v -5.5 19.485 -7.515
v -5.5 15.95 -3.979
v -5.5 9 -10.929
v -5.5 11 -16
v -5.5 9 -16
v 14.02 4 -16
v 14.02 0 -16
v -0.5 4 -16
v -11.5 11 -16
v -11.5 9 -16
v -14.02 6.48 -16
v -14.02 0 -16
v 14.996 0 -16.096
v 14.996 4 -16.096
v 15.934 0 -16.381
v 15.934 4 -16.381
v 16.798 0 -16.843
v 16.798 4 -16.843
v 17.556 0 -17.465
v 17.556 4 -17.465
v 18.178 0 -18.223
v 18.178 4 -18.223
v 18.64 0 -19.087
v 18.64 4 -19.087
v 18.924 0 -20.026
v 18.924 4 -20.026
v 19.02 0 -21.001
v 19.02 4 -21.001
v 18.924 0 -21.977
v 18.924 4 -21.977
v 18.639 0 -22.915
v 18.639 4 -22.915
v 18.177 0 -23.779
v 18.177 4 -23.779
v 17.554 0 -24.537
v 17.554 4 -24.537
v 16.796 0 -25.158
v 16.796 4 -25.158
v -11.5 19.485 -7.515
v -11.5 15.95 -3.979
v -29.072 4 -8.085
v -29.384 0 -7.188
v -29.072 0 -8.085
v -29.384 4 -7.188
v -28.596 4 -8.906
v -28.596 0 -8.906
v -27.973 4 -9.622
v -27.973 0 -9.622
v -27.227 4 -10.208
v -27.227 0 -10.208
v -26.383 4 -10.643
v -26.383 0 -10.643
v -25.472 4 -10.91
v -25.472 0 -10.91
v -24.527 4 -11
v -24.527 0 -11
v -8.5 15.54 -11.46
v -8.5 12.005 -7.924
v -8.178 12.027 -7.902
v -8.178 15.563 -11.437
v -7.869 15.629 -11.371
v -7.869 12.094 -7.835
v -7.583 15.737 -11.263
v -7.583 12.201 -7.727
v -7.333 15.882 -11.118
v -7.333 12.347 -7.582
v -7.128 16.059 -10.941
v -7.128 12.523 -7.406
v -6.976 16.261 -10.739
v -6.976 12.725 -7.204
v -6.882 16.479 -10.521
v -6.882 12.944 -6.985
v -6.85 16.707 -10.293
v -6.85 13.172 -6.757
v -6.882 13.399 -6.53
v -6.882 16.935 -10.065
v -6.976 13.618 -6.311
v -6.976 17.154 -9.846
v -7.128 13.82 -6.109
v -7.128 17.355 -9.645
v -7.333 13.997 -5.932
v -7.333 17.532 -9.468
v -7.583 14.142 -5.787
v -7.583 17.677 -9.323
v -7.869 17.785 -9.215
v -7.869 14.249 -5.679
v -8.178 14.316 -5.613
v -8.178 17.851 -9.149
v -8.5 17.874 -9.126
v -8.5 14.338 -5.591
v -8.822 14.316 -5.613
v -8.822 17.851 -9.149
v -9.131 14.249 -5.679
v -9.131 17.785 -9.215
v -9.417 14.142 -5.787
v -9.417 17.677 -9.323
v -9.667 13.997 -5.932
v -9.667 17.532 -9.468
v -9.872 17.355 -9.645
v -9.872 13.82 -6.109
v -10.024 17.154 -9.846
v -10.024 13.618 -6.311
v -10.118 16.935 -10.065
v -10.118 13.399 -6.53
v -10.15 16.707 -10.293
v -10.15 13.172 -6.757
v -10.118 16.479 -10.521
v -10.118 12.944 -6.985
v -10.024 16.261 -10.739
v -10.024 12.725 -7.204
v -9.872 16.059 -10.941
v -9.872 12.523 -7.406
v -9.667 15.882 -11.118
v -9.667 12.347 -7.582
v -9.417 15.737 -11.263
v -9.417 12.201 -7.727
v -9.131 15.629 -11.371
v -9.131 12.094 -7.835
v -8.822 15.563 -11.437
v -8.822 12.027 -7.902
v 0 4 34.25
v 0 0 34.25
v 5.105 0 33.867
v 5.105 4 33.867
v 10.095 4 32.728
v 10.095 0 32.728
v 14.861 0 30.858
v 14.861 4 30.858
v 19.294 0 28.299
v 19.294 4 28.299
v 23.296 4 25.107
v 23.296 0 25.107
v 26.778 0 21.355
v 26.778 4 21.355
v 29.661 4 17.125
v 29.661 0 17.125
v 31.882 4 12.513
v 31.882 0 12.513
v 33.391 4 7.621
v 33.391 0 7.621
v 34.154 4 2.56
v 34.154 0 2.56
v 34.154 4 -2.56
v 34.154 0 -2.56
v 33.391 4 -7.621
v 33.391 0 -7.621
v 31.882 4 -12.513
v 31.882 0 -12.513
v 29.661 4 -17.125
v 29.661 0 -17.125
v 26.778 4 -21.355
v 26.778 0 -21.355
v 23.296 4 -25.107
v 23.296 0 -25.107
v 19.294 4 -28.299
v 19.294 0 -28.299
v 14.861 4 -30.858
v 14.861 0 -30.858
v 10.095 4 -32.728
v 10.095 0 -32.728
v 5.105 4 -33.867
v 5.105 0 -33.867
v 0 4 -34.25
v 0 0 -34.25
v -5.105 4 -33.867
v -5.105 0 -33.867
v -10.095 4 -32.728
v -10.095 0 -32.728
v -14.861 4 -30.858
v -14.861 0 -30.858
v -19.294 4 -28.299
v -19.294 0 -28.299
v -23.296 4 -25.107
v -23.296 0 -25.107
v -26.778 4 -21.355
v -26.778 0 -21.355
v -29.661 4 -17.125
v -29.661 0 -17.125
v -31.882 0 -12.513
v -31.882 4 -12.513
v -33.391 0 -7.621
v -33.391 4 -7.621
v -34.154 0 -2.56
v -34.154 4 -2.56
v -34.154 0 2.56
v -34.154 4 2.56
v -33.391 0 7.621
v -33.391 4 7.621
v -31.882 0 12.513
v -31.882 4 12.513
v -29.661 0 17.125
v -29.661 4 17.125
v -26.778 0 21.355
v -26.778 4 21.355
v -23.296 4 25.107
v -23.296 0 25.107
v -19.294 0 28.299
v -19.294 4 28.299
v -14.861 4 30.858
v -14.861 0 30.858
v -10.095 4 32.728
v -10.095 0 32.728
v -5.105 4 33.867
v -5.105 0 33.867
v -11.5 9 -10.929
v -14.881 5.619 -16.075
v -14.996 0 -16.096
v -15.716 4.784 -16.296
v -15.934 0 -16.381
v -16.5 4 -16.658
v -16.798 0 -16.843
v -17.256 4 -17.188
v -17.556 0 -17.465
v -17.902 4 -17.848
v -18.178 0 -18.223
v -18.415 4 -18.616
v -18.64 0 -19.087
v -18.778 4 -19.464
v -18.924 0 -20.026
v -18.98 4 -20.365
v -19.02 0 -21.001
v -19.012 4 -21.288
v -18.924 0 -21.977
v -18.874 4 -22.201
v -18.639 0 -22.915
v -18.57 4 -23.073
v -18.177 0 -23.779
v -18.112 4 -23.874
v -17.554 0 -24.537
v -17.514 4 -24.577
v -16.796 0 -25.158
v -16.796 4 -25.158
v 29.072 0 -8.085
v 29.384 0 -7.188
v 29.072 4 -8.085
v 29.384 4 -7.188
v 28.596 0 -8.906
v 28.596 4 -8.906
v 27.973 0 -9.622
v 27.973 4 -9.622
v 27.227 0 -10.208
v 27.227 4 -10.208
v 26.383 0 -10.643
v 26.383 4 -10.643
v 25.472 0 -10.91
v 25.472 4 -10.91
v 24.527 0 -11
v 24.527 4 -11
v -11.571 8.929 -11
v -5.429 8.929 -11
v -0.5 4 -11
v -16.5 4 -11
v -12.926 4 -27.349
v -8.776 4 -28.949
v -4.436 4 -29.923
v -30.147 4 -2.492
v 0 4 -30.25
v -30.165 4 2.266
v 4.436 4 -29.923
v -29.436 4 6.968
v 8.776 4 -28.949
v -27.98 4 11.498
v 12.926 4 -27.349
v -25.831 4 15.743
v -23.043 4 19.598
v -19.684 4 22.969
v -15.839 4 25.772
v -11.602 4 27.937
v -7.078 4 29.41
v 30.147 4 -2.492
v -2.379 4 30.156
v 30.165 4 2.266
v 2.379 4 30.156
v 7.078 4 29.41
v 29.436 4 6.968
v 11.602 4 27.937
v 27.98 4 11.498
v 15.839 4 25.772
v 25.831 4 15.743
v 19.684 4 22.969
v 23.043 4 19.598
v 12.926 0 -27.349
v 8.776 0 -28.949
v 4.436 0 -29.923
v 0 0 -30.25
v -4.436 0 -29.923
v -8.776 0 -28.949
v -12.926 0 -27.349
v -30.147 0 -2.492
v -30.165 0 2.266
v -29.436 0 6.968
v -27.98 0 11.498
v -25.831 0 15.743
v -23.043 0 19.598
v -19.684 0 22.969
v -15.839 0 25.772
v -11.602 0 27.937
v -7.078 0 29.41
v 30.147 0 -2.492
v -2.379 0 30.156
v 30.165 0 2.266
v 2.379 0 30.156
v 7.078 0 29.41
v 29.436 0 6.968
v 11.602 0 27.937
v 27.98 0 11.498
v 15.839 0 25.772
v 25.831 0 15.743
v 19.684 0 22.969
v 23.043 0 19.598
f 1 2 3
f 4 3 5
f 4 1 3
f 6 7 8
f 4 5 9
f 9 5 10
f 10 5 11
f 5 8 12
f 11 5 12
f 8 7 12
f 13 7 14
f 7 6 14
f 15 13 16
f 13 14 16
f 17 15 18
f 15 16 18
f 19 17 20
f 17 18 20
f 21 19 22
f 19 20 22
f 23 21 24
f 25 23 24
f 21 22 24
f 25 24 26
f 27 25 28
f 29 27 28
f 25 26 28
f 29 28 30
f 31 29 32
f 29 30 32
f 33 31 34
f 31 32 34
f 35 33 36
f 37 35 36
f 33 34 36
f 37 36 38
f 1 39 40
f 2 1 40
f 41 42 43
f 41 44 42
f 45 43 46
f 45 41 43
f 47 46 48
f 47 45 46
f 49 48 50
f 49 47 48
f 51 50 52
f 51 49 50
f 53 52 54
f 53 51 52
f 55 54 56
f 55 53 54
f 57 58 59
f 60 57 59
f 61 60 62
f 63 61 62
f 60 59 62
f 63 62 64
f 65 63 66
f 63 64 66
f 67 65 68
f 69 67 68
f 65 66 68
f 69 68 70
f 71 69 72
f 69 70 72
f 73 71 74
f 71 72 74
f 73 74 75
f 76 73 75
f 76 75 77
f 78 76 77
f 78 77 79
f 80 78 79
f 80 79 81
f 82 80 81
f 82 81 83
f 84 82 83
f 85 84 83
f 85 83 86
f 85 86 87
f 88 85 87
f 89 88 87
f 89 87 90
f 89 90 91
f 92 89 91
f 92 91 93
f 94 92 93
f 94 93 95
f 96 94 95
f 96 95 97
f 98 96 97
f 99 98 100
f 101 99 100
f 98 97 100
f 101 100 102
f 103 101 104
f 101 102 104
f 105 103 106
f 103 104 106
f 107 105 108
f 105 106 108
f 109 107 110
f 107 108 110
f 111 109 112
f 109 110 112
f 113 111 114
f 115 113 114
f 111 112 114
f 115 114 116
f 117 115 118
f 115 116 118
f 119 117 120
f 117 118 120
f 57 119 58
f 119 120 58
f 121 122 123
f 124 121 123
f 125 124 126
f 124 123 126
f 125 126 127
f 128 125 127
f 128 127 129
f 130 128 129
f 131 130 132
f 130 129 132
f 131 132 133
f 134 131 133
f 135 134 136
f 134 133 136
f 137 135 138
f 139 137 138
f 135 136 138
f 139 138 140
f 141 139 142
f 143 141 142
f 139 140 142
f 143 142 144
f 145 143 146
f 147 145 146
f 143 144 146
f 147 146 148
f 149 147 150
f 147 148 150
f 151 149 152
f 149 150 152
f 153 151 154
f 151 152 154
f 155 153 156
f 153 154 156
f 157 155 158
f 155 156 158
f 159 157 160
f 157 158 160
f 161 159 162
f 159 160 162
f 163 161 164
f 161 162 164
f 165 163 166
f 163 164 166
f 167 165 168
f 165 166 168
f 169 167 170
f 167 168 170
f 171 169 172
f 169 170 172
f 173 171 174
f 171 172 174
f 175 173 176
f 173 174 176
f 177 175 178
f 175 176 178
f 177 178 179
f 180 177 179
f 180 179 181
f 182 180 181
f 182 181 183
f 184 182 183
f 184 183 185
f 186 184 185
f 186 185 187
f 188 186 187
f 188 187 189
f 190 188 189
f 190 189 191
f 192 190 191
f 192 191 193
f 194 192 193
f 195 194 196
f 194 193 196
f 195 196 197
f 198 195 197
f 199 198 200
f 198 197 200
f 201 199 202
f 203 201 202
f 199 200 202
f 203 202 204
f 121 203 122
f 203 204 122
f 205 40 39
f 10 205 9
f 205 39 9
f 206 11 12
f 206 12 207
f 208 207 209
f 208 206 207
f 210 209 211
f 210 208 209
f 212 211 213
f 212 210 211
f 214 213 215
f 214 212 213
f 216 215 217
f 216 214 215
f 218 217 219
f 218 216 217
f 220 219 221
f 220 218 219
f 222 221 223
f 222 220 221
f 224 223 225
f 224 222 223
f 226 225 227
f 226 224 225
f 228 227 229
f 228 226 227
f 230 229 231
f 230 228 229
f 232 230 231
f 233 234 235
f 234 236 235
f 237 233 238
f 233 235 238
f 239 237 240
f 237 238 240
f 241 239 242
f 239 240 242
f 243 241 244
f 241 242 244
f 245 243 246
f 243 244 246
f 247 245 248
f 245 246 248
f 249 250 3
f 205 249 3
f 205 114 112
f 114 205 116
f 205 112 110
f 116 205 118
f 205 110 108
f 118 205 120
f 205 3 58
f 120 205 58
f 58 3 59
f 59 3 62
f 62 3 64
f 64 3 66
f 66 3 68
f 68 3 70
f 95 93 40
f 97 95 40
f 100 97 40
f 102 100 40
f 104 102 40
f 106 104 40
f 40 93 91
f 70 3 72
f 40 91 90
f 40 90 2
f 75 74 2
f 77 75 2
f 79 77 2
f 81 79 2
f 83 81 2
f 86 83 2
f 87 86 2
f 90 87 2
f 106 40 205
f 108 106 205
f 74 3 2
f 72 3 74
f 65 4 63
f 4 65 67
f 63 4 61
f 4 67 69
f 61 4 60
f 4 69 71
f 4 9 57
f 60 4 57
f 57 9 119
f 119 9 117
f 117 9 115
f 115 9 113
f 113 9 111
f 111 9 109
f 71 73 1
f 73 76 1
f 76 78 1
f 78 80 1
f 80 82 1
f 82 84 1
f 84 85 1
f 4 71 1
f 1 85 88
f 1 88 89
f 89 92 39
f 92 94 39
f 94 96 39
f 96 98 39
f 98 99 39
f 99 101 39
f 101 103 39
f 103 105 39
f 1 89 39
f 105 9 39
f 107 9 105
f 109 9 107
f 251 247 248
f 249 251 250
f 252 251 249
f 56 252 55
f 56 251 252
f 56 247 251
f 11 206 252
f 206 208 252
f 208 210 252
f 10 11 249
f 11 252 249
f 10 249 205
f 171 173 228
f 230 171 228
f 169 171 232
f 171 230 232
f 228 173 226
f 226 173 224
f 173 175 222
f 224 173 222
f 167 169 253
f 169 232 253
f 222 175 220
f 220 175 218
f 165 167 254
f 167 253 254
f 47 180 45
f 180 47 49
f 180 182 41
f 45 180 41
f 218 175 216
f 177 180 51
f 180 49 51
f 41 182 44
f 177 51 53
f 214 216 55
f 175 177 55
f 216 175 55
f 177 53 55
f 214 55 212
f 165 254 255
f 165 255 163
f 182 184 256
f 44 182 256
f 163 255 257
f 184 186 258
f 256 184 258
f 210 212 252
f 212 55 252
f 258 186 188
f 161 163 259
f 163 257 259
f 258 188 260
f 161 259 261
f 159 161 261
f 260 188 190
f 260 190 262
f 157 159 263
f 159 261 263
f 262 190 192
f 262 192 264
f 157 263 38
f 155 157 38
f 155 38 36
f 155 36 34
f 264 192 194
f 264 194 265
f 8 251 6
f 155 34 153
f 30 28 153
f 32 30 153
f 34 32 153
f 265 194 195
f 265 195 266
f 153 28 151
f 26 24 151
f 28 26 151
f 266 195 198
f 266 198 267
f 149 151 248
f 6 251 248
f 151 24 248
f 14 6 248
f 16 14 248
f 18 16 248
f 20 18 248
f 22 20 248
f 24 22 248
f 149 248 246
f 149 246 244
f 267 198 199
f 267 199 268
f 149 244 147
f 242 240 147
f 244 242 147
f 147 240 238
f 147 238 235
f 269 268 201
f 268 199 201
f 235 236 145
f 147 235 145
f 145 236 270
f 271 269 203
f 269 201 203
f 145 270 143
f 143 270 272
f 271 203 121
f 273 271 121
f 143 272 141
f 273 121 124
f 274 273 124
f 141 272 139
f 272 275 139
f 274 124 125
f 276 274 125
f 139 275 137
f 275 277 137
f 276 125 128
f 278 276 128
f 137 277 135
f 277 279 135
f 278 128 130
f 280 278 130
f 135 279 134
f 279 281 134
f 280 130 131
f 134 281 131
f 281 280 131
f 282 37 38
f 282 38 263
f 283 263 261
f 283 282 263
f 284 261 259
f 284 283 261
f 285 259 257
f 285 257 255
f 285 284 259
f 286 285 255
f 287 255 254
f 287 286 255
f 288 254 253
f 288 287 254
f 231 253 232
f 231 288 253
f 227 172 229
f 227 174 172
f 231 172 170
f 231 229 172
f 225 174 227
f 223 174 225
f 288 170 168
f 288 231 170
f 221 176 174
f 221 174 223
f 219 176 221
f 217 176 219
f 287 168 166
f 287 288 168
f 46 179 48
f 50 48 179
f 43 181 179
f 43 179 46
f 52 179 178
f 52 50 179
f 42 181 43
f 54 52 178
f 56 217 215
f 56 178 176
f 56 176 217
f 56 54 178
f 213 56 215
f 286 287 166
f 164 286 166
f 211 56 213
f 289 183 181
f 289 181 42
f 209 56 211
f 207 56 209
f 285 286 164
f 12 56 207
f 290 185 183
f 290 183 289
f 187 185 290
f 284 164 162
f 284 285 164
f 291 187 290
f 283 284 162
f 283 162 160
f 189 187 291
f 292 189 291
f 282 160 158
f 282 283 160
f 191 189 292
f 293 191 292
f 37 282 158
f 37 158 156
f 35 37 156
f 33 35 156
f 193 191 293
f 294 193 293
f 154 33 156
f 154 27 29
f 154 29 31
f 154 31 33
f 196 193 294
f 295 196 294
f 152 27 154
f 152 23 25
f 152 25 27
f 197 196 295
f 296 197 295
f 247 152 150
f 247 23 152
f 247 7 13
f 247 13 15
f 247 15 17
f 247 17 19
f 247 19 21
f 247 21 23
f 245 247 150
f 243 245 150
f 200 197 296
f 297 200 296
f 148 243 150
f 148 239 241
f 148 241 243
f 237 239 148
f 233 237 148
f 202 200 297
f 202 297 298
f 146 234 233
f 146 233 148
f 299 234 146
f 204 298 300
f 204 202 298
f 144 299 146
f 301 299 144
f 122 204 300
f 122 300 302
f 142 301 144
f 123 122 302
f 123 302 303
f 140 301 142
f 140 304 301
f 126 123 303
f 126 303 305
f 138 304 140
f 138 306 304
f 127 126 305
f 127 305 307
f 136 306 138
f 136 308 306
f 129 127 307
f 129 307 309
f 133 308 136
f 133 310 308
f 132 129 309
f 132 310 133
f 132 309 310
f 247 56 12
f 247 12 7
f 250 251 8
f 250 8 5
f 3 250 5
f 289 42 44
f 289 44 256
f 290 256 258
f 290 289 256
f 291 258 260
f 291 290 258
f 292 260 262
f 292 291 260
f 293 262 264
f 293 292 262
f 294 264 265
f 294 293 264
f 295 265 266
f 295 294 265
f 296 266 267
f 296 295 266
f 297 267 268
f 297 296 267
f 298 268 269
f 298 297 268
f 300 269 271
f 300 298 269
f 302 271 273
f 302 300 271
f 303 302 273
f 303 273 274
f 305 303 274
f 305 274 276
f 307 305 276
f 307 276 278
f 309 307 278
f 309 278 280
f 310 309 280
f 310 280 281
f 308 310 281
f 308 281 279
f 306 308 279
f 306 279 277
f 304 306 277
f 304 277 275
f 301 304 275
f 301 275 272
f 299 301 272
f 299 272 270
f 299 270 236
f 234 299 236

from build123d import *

# Parameters (mm, degrees)
SKETCH1_R           = 34.25
SKETCH1_R_2         = 30.25
BOSS_EXTRUDE1_DEPTH = 4
BOSS_EXTRUDE2_START = -11.5
BOSS_EXTRUDE2_DEPTH = 6
BOSS_EXTRUDE3_START = 4
BOSS_EXTRUDE3_DEPTH = 4
CHAMFER1_SIZE       = 5
FILLET1_R           = 5
CUT_EXTRUDE2_REACH  = 58.809
SKETCH6_R           = 1.65


with BuildPart() as part:
    # Sketch1 → Boss-Extrude1 (new body)
    with BuildSketch(Plane(origin=(0, 0, 0), x_dir=(1, 0, 0), z_dir=(0, 1, 0))):
        with Locations(Location((0, 0, 0), (0, 0, 270))):
            Circle(SKETCH1_R)
        with Locations(Location((0, 0, 0), (0, 0, 270))):
            Circle(SKETCH1_R_2, mode=Mode.SUBTRACT)
    extrude(amount=BOSS_EXTRUDE1_DEPTH)



with BuildPart() as body_2:
    # Sketch2 → Boss-Extrude2 (new body)
    with BuildSketch(Plane(origin=(0, 0, 0), x_dir=(0, 0, -1), z_dir=(1, 0, 0)).offset(BOSS_EXTRUDE2_START)):
        Polygon((3.97918472, 15.949747468), (11, 8.928932188), (11, 4), (16, 4), (16, 11), (7.514718626, 19.485281374), align=None)
    extrude(amount=BOSS_EXTRUDE2_DEPTH)


with BuildPart() as part_1:
    add(part.part)

    add(body_2.part)  # Boss-Extrude3 merges body 2
    # Sketch5 → Boss-Extrude3 (add)
    with BuildSketch(Plane.XZ.offset(-4).offset(BOSS_EXTRUDE3_START)):
        with BuildLine():
            Line((28.179114606, -11), (-28.179114606, -11))
            ThreePointArc((-28.179114606, -11), (-27.041474823, -13.558065475), (-25.672212604, -16))
            Line((-25.672212604, -16), (25.672212604, -16))
            ThreePointArc((25.672212604, -16), (27.041474823, -13.558065475), (28.179114606, -11))
        make_face()
    extrude(amount=-BOSS_EXTRUDE3_DEPTH)

    # Chamfer1
    # the kernel refuses this chamfer: 5 mm, written as the material it adds along each edge
    with BuildSketch(Plane(origin=(-11.5, 4, 1.85841494), x_dir=(-0.9996219169112968, -0.027495876610586403, 0), z_dir=(0, 0, -1))) as chamfer1_piece_1_section:
        Polygon((CHAMFER1_SIZE * 0.999621916911, CHAMFER1_SIZE * 0.0274958766106), (-CHAMFER1_SIZE * 0.0274958766106, CHAMFER1_SIZE * 0.999621916911), (0, 0), align=None)
    chamfer1_piece_1 = extrude(amount=17.85841494, mode=Mode.PRIVATE)
    chamfer1_piece_1 = split(chamfer1_piece_1, bisect_by=Plane(origin=(-11.354428767, 9.056622431, -11), z_dir=(0, 0, 1)), keep=Keep.TOP, mode=Mode.PRIVATE)
    chamfer1_piece_1 = split(chamfer1_piece_1, bisect_by=Plane(origin=(-11.354428767, 9.02469987, -10.904232318), z_dir=(0, 0.7071067811865489, -0.7071067811865462)), keep=Keep.TOP, mode=Mode.PRIVATE)
    add(chamfer1_piece_1)
    with BuildSketch(Plane(origin=(-11.5, 4, -11), x_dir=(-0.9996219169112968, -0.027495876610586924, 0), z_dir=(0, 0, -1))) as chamfer1_piece_2_section:
        Polygon((CHAMFER1_SIZE * 0.999621916911, CHAMFER1_SIZE * 0.0274958766106), (-CHAMFER1_SIZE * 0.0274958766106, CHAMFER1_SIZE * 0.999621916911), (0, 0), align=None)
    chamfer1_piece_2 = extrude(amount=5, mode=Mode.PRIVATE)
    chamfer1_piece_2 = split(chamfer1_piece_2, bisect_by=Plane(origin=(-13.406884942, 6.106803662, -13.822128526), z_dir=(0, -0.7071067811865489, 0.7071067811865462)), keep=Keep.TOP, mode=Mode.PRIVATE)
    add(chamfer1_piece_2)
    with BuildSketch(Plane(origin=(-11.5, 4, -11), x_dir=(-0.9996219169112968, -0.027495876610586924, 0), z_dir=(0, 0, -1))) as chamfer1_piece_3_section:
        Polygon((CHAMFER1_SIZE * 0.999621916911, CHAMFER1_SIZE * 0.0274958766106), (-CHAMFER1_SIZE * 0.0274958766106, CHAMFER1_SIZE * 0.999621916911), (0, 0), align=None)
    chamfer1_piece_3 = extrude(amount=5, mode=Mode.PRIVATE)
    chamfer1_piece_3 = split(chamfer1_piece_3, bisect_by=Plane(origin=(-12.657418843, 5.909631949, -14.019300239), z_dir=(0, 0.7071067811865489, -0.7071067811865462)), keep=Keep.TOP, mode=Mode.PRIVATE)
    add(chamfer1_piece_3)
    with BuildSketch(Plane(origin=(-5.5, 4, 1.85841494), x_dir=(0.9996219169112968, -0.027495876610586403, 0), z_dir=(0, 0, -1))) as chamfer1_piece_4_section:
        Polygon((CHAMFER1_SIZE * 0.999621916911, -CHAMFER1_SIZE * 0.0274958766106), (-CHAMFER1_SIZE * 0.0274958766106, -CHAMFER1_SIZE * 0.999621916911), (0, 0), align=None)
    chamfer1_piece_4 = extrude(amount=17.85841494, mode=Mode.PRIVATE)
    chamfer1_piece_4 = split(chamfer1_piece_4, bisect_by=Plane(origin=(-5.645571233, 9.056622431, -11), z_dir=(0, 0, 1)), keep=Keep.TOP, mode=Mode.PRIVATE)
    chamfer1_piece_4 = split(chamfer1_piece_4, bisect_by=Plane(origin=(-5.645571233, 9.02469987, -10.904232318), z_dir=(0, 0.7071067811865489, -0.7071067811865462)), keep=Keep.TOP, mode=Mode.PRIVATE)
    add(chamfer1_piece_4)
    with BuildSketch(Plane(origin=(-5.5, 4, -11), x_dir=(0.9996219169112968, -0.027495876610586924, 0), z_dir=(0, 0, -1))) as chamfer1_piece_5_section:
        Polygon((CHAMFER1_SIZE * 0.999621916911, -CHAMFER1_SIZE * 0.0274958766106), (-CHAMFER1_SIZE * 0.0274958766106, -CHAMFER1_SIZE * 0.999621916911), (0, 0), align=None)
    chamfer1_piece_5 = extrude(amount=5, mode=Mode.PRIVATE)
    chamfer1_piece_5 = split(chamfer1_piece_5, bisect_by=Plane(origin=(-3.593115058, 6.106803662, -13.822128526), z_dir=(0, -0.7071067811865489, 0.7071067811865462)), keep=Keep.TOP, mode=Mode.PRIVATE)
    add(chamfer1_piece_5)
    with BuildSketch(Plane(origin=(-5.5, 4, -11), x_dir=(0.9996219169112968, -0.027495876610586924, 0), z_dir=(0, 0, -1))) as chamfer1_piece_6_section:
        Polygon((CHAMFER1_SIZE * 0.999621916911, -CHAMFER1_SIZE * 0.0274958766106), (-CHAMFER1_SIZE * 0.0274958766106, -CHAMFER1_SIZE * 0.999621916911), (0, 0), align=None)
    chamfer1_piece_6 = extrude(amount=5, mode=Mode.PRIVATE)
    chamfer1_piece_6 = split(chamfer1_piece_6, bisect_by=Plane(origin=(-4.342581157, 5.909631949, -14.019300239), z_dir=(0, 0.7071067811865489, -0.7071067811865462)), keep=Keep.TOP, mode=Mode.PRIVATE)
    add(chamfer1_piece_6)

    # Fillet1
    fillet1_edges = [part_1.edges().sort_by_distance(p)[0] for p in [
        (-25.672212604, 2, -16),
        (-28.179114606, 2, -11),
        (28.179114606, 2, -11),
        (25.672212604, 2, -16),
    ]]
    fillet(fillet1_edges, radius=FILLET1_R)

    # Sketch6 → Cut-Extrude2 (cut, up to next)
    with BuildSketch(Plane(origin=(0, 9.964466094, -9.964466094), x_dir=(1, 0, 0), z_dir=(0, -0.7071067811865487, 0.7071067811865464)), mode=Mode.PRIVATE) as cut_extrude2_sk1:
        with Locations(Location((-8.5, 4.535533906, 0), (0, 0, 270))):
            Circle(SKETCH6_R)
    cut_extrude2_tool1 = extrude(cut_extrude2_sk1.sketch, amount=-CUT_EXTRUDE2_REACH, mode=Mode.PRIVATE) & part_1.part
    add(cut_extrude2_tool1.solids().sort_by_distance((-8.5, 13.171573, -6.757359))[0], mode=Mode.SUBTRACT)


solid = part_1.part
